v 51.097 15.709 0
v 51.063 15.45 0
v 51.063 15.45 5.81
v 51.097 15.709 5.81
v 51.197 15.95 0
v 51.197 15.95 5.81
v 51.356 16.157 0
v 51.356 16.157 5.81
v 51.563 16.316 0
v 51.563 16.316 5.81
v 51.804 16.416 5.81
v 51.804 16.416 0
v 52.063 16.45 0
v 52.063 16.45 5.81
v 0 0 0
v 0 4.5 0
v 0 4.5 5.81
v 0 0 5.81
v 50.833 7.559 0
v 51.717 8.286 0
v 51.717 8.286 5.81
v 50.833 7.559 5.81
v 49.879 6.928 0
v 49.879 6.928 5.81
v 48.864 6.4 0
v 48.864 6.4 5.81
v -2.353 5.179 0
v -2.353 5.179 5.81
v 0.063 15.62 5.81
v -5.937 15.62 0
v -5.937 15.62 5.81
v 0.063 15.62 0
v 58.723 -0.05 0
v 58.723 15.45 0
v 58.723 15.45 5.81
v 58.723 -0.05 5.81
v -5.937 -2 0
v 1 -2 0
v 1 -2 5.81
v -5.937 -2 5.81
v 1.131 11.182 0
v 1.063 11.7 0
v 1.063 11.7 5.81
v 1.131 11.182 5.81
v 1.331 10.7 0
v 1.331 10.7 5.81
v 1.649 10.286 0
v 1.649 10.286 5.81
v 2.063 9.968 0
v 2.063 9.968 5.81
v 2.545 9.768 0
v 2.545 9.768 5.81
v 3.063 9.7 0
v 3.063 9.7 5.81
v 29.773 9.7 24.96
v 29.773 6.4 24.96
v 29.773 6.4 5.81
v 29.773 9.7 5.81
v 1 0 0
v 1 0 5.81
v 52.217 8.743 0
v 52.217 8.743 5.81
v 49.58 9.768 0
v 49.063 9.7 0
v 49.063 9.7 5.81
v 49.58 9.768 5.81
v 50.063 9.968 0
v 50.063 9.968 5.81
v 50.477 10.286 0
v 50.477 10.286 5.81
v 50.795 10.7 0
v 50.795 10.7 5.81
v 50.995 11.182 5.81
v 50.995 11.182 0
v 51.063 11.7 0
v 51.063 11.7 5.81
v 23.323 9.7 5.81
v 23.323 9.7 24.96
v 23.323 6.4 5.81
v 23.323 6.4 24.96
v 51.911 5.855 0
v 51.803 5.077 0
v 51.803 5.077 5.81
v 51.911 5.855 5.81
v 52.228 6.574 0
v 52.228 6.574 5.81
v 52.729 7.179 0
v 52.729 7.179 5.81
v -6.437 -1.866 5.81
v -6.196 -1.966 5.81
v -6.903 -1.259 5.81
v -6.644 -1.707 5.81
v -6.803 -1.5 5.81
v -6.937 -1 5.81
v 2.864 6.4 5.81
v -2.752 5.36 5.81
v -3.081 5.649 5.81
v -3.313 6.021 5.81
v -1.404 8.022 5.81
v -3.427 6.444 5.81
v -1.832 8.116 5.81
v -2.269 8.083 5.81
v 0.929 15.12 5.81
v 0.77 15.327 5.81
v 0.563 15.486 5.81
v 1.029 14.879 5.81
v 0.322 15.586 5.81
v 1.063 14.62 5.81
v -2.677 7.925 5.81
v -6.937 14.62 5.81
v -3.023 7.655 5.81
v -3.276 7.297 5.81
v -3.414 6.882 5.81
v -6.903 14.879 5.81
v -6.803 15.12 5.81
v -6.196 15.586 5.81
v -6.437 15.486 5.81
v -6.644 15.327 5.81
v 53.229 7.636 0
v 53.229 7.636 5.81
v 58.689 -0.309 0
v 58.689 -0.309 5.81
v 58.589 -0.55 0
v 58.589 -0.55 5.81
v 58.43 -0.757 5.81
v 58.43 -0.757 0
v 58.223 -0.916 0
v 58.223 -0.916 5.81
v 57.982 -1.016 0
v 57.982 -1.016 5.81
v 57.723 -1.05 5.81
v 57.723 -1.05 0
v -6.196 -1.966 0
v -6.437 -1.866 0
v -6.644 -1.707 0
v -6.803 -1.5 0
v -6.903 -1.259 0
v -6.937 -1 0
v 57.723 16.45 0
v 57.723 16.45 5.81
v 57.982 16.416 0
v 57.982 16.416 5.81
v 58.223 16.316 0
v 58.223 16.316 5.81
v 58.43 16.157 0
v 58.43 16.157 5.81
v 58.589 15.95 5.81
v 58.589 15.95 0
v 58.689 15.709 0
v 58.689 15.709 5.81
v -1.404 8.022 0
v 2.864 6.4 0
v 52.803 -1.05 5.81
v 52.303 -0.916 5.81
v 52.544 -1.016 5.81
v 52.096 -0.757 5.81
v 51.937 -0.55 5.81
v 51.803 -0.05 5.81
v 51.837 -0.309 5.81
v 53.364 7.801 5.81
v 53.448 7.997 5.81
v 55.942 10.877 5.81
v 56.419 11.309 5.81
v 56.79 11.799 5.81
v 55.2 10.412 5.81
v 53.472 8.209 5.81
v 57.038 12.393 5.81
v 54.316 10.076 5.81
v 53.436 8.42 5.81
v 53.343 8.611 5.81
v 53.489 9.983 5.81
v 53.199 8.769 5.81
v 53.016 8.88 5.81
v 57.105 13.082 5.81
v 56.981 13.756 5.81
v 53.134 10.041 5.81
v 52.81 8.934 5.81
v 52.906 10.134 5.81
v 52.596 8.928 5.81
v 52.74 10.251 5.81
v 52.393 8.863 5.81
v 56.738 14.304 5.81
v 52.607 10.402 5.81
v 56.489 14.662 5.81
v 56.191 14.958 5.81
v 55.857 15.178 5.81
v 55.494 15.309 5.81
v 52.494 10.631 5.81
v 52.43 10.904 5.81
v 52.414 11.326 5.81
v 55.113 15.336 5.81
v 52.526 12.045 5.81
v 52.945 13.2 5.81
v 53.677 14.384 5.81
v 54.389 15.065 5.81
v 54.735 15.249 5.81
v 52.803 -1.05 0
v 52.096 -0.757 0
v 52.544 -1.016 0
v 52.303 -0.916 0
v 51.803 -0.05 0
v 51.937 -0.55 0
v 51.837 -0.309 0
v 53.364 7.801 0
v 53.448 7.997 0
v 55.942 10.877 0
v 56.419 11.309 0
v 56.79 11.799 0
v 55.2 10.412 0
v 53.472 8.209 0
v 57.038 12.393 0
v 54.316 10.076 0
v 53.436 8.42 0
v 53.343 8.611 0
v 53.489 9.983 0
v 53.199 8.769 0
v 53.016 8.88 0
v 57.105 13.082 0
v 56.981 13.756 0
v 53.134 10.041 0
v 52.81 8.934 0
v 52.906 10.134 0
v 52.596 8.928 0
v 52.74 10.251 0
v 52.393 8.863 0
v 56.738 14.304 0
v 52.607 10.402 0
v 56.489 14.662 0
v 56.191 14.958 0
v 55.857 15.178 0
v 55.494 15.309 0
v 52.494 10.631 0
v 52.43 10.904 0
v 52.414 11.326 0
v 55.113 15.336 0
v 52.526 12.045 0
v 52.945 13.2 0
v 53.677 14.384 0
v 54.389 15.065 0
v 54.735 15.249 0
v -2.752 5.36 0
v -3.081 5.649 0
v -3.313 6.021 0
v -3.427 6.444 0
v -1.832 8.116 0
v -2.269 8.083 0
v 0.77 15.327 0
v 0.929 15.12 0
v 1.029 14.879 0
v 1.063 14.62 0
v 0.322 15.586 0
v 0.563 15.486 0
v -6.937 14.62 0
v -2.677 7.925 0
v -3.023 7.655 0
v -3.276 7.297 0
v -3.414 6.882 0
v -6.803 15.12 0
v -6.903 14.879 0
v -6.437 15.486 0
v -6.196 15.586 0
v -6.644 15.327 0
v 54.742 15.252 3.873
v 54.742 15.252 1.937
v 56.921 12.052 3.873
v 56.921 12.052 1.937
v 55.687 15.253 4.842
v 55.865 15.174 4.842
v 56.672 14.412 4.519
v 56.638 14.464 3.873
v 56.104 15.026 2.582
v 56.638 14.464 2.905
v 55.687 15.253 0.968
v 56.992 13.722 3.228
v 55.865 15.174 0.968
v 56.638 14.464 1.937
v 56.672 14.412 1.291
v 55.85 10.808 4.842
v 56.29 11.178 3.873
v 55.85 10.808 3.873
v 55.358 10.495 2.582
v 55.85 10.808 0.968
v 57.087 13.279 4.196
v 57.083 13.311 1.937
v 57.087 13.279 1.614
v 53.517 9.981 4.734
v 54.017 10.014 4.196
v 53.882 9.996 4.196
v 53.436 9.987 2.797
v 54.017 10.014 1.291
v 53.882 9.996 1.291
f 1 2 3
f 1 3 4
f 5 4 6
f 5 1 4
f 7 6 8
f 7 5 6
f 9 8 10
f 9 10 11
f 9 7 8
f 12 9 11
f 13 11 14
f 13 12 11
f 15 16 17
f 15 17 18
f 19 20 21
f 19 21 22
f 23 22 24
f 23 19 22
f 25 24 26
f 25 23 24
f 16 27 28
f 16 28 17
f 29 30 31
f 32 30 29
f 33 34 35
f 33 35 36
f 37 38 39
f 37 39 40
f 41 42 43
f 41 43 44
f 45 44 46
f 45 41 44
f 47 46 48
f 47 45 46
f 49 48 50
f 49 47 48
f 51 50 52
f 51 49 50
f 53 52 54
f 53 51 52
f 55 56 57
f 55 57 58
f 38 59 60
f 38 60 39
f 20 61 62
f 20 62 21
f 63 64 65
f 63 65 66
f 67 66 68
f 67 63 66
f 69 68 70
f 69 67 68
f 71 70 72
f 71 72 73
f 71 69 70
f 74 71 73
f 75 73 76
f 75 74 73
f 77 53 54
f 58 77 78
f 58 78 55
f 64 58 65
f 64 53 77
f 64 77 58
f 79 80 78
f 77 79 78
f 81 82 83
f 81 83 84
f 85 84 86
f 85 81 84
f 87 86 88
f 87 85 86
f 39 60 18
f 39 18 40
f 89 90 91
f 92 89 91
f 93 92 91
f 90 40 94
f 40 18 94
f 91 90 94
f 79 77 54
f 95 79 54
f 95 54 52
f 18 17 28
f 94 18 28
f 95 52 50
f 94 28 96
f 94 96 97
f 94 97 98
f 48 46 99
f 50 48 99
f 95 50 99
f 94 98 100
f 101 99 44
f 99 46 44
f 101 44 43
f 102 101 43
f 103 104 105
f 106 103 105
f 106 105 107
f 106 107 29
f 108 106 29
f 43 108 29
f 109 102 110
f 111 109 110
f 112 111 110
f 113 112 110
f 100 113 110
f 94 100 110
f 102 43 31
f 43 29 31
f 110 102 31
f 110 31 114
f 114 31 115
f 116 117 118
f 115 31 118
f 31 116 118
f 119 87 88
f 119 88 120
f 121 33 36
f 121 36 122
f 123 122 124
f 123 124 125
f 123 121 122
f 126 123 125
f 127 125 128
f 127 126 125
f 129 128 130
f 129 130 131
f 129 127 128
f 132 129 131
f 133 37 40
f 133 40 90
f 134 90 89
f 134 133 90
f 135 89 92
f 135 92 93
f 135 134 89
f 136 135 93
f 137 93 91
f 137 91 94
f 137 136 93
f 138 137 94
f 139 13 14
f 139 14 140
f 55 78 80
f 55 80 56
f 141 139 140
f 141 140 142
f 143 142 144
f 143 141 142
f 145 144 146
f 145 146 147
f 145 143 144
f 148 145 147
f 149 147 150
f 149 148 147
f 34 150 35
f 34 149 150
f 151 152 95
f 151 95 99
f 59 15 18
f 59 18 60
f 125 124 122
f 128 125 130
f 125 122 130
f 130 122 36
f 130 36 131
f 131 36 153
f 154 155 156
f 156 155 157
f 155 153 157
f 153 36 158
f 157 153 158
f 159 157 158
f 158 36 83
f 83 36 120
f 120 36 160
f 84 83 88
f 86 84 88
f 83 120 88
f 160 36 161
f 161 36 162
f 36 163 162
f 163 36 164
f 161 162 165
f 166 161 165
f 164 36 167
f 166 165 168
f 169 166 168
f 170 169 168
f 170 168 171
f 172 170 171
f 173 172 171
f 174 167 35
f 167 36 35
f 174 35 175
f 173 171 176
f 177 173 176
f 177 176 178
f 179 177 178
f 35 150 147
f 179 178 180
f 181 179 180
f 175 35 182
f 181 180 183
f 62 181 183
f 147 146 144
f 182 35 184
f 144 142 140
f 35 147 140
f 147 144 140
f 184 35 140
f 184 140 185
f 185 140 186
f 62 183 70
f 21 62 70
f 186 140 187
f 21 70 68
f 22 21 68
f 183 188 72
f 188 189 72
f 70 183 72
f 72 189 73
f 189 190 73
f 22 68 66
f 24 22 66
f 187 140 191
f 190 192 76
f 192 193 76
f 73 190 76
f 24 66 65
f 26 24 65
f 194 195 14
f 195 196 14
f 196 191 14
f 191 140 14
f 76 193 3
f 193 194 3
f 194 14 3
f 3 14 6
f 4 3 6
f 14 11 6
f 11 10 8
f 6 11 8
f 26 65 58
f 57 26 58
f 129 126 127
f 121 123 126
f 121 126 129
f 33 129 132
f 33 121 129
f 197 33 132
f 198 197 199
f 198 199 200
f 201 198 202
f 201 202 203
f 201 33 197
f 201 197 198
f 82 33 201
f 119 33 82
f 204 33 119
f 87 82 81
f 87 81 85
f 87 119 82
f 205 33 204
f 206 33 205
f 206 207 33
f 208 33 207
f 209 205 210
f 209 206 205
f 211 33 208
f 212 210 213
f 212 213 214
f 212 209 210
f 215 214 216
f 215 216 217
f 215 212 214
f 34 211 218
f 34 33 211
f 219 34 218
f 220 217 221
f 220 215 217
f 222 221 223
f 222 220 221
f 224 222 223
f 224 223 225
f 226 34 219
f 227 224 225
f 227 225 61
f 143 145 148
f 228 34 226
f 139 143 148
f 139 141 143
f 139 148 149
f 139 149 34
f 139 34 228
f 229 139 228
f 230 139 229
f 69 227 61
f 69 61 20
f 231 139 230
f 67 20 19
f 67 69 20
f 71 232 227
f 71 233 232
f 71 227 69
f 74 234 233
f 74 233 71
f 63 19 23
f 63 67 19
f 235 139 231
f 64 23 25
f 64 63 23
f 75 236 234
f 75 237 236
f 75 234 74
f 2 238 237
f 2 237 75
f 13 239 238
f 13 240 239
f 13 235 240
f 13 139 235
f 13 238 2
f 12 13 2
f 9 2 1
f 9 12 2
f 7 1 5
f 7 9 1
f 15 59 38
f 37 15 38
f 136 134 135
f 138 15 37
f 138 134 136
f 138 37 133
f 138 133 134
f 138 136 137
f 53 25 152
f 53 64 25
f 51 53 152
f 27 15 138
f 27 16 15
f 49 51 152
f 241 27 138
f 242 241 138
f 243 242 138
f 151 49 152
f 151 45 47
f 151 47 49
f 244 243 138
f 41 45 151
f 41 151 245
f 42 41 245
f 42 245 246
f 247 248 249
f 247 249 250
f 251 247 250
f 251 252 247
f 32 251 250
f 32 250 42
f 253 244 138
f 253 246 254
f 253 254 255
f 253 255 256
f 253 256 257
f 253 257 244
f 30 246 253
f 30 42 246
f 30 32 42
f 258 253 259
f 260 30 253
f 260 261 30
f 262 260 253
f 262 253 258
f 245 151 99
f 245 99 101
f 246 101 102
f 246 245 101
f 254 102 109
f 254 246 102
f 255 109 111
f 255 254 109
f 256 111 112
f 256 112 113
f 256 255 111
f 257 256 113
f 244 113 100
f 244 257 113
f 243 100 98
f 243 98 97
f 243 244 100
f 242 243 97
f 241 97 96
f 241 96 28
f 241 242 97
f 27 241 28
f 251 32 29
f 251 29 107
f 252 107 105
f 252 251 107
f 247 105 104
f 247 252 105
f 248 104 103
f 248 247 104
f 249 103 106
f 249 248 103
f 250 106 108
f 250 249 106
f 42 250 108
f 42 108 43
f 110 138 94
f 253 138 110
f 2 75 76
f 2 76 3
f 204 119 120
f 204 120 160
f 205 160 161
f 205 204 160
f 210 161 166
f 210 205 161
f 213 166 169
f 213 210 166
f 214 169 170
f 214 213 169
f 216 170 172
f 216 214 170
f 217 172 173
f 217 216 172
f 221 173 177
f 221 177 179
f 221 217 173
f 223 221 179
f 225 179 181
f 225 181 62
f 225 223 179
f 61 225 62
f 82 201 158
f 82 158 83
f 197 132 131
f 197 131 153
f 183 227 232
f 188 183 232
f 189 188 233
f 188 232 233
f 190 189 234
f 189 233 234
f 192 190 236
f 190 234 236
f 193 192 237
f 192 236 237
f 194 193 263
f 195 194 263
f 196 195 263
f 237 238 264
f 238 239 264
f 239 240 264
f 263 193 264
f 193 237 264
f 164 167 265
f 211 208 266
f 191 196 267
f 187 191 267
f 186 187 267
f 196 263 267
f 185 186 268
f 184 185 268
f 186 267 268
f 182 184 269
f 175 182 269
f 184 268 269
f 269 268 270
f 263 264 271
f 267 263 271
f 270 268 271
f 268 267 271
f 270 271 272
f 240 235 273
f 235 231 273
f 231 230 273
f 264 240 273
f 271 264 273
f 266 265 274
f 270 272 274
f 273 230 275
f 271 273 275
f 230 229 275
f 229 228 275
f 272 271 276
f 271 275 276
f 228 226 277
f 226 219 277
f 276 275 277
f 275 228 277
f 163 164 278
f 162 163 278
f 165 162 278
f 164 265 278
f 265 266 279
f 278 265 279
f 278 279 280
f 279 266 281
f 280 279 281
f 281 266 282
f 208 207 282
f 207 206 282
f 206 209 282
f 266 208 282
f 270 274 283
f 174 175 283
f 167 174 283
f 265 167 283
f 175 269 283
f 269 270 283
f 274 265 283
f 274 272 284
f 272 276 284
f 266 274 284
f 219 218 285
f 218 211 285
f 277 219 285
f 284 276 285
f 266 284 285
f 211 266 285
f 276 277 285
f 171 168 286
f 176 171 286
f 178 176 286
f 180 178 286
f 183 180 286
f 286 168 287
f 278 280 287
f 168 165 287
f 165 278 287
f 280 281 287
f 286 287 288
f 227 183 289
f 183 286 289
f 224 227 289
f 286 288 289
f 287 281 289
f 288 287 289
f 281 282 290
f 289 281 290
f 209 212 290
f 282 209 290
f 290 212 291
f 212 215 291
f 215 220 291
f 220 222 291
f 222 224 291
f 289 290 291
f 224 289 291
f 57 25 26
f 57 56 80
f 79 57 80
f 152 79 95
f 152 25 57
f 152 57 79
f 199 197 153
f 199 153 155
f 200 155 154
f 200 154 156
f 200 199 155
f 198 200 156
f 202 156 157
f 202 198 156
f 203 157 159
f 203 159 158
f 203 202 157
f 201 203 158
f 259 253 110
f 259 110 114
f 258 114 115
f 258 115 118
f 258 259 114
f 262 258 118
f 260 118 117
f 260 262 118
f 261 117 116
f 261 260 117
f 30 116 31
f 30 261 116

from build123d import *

# Parameters (mm, degrees)
PAD_DEPTH    = 5.81
SKETCH_W     = 6.45
SKETCH_H     = 3.3
PAD001_DEPTH = 19.15


with BuildPart() as part:
    # Sketch001 → Pad (new body)
    with BuildSketch(Plane.XY):
        with BuildLine():
            Line((3.062746, 9.7), (49.062746, 9.7))
            ThreePointArc((49.062746, 9.7), (50.47696, 10.285786), (51.062746, 11.7))
            Line((51.062746, 11.7), (51.062746, 15.45))
            ThreePointArc((51.062746, 15.45), (51.355639, 16.157107), (52.062746, 16.45))
            Line((52.062746, 16.45), (57.722746, 16.45))
            ThreePointArc((57.722746, 16.45), (58.429853, 16.157107), (58.722746, 15.45))
            Line((58.722746, 15.45), (58.722746, -0.05))
            ThreePointArc((58.722746, -0.05), (58.429853, -0.757107), (57.722746, -1.05))
            Line((57.722746, -1.05), (52.802746, -1.05))
            ThreePointArc((52.802746, -1.05), (52.095639, -0.757107), (51.802746, -0.05))
            Line((51.802746, -0.05), (51.802746, 5.077003))
            ThreePointArc((51.802746, 5.077003), (52.044532, 6.225282), (52.728831, 7.17856))
            Line((52.728831, 7.17856), (53.228831, 7.635716))
            ThreePointArc((53.228831, 7.635716), (53.27626, 8.695315), (52.216661, 8.742744))
            Line((52.216661, 8.742744), (51.716661, 8.285588))
            ThreePointArc((51.716661, 8.285588), (50.364126, 7.230817), (48.863581, 6.4))
            Line((48.863581, 6.4), (2.863581, 6.4))
            Line((2.863581, 6.4), (-1.404332, 8.022139))
            ThreePointArc((-1.404332, 8.022139), (-3.360147, 7.094739), (-2.353004, 5.178767))
            Line((-2.353004, 5.178767), (0, 4.5))
            Line((0, 4.5), (0, 0))
            Line((0, 0), (1, 0))
            Line((1, 0), (1, -2))
            Line((1, -2), (-5.937254, -2))
            ThreePointArc((-5.937254, -2), (-6.644361, -1.707107), (-6.937254, -1))
            Line((-6.937254, -1), (-6.937254, 14.62))
            ThreePointArc((-6.937254, 14.62), (-6.644361, 15.327107), (-5.937254, 15.62))
            Line((-5.937254, 15.62), (0.062746, 15.62))
            ThreePointArc((0.062746, 15.62), (0.769853, 15.327107), (1.062746, 14.62))
            Line((1.062746, 14.62), (1.062746, 11.7))
            ThreePointArc((1.062746, 11.7), (1.648533, 10.285786), (3.062746, 9.7))
        make_face()
        with BuildLine():
            add(Edge.make_bspline(
                [(52.607008, 10.402389), (51.880554, 11.468859), (54.72685, 17.934374), (59.085572, 11.535554), (53.333461, 9.335919), (52.607008, 10.402389)],
                knots=[0, 0, 0, 0, 0.333333, 0.666667, 1, 1, 1, 1], degree=3))
        make_face(mode=Mode.SUBTRACT)
    extrude(amount=PAD_DEPTH)

    # Sketch (on Face34 of Pad) → Pad001 (join)
    with BuildSketch(Plane.XY.offset(5.81)):
        with Locations((26.547746, 8.05)):
            Rectangle(SKETCH_W, SKETCH_H)
    extrude(amount=PAD001_DEPTH)


solid = part.part
